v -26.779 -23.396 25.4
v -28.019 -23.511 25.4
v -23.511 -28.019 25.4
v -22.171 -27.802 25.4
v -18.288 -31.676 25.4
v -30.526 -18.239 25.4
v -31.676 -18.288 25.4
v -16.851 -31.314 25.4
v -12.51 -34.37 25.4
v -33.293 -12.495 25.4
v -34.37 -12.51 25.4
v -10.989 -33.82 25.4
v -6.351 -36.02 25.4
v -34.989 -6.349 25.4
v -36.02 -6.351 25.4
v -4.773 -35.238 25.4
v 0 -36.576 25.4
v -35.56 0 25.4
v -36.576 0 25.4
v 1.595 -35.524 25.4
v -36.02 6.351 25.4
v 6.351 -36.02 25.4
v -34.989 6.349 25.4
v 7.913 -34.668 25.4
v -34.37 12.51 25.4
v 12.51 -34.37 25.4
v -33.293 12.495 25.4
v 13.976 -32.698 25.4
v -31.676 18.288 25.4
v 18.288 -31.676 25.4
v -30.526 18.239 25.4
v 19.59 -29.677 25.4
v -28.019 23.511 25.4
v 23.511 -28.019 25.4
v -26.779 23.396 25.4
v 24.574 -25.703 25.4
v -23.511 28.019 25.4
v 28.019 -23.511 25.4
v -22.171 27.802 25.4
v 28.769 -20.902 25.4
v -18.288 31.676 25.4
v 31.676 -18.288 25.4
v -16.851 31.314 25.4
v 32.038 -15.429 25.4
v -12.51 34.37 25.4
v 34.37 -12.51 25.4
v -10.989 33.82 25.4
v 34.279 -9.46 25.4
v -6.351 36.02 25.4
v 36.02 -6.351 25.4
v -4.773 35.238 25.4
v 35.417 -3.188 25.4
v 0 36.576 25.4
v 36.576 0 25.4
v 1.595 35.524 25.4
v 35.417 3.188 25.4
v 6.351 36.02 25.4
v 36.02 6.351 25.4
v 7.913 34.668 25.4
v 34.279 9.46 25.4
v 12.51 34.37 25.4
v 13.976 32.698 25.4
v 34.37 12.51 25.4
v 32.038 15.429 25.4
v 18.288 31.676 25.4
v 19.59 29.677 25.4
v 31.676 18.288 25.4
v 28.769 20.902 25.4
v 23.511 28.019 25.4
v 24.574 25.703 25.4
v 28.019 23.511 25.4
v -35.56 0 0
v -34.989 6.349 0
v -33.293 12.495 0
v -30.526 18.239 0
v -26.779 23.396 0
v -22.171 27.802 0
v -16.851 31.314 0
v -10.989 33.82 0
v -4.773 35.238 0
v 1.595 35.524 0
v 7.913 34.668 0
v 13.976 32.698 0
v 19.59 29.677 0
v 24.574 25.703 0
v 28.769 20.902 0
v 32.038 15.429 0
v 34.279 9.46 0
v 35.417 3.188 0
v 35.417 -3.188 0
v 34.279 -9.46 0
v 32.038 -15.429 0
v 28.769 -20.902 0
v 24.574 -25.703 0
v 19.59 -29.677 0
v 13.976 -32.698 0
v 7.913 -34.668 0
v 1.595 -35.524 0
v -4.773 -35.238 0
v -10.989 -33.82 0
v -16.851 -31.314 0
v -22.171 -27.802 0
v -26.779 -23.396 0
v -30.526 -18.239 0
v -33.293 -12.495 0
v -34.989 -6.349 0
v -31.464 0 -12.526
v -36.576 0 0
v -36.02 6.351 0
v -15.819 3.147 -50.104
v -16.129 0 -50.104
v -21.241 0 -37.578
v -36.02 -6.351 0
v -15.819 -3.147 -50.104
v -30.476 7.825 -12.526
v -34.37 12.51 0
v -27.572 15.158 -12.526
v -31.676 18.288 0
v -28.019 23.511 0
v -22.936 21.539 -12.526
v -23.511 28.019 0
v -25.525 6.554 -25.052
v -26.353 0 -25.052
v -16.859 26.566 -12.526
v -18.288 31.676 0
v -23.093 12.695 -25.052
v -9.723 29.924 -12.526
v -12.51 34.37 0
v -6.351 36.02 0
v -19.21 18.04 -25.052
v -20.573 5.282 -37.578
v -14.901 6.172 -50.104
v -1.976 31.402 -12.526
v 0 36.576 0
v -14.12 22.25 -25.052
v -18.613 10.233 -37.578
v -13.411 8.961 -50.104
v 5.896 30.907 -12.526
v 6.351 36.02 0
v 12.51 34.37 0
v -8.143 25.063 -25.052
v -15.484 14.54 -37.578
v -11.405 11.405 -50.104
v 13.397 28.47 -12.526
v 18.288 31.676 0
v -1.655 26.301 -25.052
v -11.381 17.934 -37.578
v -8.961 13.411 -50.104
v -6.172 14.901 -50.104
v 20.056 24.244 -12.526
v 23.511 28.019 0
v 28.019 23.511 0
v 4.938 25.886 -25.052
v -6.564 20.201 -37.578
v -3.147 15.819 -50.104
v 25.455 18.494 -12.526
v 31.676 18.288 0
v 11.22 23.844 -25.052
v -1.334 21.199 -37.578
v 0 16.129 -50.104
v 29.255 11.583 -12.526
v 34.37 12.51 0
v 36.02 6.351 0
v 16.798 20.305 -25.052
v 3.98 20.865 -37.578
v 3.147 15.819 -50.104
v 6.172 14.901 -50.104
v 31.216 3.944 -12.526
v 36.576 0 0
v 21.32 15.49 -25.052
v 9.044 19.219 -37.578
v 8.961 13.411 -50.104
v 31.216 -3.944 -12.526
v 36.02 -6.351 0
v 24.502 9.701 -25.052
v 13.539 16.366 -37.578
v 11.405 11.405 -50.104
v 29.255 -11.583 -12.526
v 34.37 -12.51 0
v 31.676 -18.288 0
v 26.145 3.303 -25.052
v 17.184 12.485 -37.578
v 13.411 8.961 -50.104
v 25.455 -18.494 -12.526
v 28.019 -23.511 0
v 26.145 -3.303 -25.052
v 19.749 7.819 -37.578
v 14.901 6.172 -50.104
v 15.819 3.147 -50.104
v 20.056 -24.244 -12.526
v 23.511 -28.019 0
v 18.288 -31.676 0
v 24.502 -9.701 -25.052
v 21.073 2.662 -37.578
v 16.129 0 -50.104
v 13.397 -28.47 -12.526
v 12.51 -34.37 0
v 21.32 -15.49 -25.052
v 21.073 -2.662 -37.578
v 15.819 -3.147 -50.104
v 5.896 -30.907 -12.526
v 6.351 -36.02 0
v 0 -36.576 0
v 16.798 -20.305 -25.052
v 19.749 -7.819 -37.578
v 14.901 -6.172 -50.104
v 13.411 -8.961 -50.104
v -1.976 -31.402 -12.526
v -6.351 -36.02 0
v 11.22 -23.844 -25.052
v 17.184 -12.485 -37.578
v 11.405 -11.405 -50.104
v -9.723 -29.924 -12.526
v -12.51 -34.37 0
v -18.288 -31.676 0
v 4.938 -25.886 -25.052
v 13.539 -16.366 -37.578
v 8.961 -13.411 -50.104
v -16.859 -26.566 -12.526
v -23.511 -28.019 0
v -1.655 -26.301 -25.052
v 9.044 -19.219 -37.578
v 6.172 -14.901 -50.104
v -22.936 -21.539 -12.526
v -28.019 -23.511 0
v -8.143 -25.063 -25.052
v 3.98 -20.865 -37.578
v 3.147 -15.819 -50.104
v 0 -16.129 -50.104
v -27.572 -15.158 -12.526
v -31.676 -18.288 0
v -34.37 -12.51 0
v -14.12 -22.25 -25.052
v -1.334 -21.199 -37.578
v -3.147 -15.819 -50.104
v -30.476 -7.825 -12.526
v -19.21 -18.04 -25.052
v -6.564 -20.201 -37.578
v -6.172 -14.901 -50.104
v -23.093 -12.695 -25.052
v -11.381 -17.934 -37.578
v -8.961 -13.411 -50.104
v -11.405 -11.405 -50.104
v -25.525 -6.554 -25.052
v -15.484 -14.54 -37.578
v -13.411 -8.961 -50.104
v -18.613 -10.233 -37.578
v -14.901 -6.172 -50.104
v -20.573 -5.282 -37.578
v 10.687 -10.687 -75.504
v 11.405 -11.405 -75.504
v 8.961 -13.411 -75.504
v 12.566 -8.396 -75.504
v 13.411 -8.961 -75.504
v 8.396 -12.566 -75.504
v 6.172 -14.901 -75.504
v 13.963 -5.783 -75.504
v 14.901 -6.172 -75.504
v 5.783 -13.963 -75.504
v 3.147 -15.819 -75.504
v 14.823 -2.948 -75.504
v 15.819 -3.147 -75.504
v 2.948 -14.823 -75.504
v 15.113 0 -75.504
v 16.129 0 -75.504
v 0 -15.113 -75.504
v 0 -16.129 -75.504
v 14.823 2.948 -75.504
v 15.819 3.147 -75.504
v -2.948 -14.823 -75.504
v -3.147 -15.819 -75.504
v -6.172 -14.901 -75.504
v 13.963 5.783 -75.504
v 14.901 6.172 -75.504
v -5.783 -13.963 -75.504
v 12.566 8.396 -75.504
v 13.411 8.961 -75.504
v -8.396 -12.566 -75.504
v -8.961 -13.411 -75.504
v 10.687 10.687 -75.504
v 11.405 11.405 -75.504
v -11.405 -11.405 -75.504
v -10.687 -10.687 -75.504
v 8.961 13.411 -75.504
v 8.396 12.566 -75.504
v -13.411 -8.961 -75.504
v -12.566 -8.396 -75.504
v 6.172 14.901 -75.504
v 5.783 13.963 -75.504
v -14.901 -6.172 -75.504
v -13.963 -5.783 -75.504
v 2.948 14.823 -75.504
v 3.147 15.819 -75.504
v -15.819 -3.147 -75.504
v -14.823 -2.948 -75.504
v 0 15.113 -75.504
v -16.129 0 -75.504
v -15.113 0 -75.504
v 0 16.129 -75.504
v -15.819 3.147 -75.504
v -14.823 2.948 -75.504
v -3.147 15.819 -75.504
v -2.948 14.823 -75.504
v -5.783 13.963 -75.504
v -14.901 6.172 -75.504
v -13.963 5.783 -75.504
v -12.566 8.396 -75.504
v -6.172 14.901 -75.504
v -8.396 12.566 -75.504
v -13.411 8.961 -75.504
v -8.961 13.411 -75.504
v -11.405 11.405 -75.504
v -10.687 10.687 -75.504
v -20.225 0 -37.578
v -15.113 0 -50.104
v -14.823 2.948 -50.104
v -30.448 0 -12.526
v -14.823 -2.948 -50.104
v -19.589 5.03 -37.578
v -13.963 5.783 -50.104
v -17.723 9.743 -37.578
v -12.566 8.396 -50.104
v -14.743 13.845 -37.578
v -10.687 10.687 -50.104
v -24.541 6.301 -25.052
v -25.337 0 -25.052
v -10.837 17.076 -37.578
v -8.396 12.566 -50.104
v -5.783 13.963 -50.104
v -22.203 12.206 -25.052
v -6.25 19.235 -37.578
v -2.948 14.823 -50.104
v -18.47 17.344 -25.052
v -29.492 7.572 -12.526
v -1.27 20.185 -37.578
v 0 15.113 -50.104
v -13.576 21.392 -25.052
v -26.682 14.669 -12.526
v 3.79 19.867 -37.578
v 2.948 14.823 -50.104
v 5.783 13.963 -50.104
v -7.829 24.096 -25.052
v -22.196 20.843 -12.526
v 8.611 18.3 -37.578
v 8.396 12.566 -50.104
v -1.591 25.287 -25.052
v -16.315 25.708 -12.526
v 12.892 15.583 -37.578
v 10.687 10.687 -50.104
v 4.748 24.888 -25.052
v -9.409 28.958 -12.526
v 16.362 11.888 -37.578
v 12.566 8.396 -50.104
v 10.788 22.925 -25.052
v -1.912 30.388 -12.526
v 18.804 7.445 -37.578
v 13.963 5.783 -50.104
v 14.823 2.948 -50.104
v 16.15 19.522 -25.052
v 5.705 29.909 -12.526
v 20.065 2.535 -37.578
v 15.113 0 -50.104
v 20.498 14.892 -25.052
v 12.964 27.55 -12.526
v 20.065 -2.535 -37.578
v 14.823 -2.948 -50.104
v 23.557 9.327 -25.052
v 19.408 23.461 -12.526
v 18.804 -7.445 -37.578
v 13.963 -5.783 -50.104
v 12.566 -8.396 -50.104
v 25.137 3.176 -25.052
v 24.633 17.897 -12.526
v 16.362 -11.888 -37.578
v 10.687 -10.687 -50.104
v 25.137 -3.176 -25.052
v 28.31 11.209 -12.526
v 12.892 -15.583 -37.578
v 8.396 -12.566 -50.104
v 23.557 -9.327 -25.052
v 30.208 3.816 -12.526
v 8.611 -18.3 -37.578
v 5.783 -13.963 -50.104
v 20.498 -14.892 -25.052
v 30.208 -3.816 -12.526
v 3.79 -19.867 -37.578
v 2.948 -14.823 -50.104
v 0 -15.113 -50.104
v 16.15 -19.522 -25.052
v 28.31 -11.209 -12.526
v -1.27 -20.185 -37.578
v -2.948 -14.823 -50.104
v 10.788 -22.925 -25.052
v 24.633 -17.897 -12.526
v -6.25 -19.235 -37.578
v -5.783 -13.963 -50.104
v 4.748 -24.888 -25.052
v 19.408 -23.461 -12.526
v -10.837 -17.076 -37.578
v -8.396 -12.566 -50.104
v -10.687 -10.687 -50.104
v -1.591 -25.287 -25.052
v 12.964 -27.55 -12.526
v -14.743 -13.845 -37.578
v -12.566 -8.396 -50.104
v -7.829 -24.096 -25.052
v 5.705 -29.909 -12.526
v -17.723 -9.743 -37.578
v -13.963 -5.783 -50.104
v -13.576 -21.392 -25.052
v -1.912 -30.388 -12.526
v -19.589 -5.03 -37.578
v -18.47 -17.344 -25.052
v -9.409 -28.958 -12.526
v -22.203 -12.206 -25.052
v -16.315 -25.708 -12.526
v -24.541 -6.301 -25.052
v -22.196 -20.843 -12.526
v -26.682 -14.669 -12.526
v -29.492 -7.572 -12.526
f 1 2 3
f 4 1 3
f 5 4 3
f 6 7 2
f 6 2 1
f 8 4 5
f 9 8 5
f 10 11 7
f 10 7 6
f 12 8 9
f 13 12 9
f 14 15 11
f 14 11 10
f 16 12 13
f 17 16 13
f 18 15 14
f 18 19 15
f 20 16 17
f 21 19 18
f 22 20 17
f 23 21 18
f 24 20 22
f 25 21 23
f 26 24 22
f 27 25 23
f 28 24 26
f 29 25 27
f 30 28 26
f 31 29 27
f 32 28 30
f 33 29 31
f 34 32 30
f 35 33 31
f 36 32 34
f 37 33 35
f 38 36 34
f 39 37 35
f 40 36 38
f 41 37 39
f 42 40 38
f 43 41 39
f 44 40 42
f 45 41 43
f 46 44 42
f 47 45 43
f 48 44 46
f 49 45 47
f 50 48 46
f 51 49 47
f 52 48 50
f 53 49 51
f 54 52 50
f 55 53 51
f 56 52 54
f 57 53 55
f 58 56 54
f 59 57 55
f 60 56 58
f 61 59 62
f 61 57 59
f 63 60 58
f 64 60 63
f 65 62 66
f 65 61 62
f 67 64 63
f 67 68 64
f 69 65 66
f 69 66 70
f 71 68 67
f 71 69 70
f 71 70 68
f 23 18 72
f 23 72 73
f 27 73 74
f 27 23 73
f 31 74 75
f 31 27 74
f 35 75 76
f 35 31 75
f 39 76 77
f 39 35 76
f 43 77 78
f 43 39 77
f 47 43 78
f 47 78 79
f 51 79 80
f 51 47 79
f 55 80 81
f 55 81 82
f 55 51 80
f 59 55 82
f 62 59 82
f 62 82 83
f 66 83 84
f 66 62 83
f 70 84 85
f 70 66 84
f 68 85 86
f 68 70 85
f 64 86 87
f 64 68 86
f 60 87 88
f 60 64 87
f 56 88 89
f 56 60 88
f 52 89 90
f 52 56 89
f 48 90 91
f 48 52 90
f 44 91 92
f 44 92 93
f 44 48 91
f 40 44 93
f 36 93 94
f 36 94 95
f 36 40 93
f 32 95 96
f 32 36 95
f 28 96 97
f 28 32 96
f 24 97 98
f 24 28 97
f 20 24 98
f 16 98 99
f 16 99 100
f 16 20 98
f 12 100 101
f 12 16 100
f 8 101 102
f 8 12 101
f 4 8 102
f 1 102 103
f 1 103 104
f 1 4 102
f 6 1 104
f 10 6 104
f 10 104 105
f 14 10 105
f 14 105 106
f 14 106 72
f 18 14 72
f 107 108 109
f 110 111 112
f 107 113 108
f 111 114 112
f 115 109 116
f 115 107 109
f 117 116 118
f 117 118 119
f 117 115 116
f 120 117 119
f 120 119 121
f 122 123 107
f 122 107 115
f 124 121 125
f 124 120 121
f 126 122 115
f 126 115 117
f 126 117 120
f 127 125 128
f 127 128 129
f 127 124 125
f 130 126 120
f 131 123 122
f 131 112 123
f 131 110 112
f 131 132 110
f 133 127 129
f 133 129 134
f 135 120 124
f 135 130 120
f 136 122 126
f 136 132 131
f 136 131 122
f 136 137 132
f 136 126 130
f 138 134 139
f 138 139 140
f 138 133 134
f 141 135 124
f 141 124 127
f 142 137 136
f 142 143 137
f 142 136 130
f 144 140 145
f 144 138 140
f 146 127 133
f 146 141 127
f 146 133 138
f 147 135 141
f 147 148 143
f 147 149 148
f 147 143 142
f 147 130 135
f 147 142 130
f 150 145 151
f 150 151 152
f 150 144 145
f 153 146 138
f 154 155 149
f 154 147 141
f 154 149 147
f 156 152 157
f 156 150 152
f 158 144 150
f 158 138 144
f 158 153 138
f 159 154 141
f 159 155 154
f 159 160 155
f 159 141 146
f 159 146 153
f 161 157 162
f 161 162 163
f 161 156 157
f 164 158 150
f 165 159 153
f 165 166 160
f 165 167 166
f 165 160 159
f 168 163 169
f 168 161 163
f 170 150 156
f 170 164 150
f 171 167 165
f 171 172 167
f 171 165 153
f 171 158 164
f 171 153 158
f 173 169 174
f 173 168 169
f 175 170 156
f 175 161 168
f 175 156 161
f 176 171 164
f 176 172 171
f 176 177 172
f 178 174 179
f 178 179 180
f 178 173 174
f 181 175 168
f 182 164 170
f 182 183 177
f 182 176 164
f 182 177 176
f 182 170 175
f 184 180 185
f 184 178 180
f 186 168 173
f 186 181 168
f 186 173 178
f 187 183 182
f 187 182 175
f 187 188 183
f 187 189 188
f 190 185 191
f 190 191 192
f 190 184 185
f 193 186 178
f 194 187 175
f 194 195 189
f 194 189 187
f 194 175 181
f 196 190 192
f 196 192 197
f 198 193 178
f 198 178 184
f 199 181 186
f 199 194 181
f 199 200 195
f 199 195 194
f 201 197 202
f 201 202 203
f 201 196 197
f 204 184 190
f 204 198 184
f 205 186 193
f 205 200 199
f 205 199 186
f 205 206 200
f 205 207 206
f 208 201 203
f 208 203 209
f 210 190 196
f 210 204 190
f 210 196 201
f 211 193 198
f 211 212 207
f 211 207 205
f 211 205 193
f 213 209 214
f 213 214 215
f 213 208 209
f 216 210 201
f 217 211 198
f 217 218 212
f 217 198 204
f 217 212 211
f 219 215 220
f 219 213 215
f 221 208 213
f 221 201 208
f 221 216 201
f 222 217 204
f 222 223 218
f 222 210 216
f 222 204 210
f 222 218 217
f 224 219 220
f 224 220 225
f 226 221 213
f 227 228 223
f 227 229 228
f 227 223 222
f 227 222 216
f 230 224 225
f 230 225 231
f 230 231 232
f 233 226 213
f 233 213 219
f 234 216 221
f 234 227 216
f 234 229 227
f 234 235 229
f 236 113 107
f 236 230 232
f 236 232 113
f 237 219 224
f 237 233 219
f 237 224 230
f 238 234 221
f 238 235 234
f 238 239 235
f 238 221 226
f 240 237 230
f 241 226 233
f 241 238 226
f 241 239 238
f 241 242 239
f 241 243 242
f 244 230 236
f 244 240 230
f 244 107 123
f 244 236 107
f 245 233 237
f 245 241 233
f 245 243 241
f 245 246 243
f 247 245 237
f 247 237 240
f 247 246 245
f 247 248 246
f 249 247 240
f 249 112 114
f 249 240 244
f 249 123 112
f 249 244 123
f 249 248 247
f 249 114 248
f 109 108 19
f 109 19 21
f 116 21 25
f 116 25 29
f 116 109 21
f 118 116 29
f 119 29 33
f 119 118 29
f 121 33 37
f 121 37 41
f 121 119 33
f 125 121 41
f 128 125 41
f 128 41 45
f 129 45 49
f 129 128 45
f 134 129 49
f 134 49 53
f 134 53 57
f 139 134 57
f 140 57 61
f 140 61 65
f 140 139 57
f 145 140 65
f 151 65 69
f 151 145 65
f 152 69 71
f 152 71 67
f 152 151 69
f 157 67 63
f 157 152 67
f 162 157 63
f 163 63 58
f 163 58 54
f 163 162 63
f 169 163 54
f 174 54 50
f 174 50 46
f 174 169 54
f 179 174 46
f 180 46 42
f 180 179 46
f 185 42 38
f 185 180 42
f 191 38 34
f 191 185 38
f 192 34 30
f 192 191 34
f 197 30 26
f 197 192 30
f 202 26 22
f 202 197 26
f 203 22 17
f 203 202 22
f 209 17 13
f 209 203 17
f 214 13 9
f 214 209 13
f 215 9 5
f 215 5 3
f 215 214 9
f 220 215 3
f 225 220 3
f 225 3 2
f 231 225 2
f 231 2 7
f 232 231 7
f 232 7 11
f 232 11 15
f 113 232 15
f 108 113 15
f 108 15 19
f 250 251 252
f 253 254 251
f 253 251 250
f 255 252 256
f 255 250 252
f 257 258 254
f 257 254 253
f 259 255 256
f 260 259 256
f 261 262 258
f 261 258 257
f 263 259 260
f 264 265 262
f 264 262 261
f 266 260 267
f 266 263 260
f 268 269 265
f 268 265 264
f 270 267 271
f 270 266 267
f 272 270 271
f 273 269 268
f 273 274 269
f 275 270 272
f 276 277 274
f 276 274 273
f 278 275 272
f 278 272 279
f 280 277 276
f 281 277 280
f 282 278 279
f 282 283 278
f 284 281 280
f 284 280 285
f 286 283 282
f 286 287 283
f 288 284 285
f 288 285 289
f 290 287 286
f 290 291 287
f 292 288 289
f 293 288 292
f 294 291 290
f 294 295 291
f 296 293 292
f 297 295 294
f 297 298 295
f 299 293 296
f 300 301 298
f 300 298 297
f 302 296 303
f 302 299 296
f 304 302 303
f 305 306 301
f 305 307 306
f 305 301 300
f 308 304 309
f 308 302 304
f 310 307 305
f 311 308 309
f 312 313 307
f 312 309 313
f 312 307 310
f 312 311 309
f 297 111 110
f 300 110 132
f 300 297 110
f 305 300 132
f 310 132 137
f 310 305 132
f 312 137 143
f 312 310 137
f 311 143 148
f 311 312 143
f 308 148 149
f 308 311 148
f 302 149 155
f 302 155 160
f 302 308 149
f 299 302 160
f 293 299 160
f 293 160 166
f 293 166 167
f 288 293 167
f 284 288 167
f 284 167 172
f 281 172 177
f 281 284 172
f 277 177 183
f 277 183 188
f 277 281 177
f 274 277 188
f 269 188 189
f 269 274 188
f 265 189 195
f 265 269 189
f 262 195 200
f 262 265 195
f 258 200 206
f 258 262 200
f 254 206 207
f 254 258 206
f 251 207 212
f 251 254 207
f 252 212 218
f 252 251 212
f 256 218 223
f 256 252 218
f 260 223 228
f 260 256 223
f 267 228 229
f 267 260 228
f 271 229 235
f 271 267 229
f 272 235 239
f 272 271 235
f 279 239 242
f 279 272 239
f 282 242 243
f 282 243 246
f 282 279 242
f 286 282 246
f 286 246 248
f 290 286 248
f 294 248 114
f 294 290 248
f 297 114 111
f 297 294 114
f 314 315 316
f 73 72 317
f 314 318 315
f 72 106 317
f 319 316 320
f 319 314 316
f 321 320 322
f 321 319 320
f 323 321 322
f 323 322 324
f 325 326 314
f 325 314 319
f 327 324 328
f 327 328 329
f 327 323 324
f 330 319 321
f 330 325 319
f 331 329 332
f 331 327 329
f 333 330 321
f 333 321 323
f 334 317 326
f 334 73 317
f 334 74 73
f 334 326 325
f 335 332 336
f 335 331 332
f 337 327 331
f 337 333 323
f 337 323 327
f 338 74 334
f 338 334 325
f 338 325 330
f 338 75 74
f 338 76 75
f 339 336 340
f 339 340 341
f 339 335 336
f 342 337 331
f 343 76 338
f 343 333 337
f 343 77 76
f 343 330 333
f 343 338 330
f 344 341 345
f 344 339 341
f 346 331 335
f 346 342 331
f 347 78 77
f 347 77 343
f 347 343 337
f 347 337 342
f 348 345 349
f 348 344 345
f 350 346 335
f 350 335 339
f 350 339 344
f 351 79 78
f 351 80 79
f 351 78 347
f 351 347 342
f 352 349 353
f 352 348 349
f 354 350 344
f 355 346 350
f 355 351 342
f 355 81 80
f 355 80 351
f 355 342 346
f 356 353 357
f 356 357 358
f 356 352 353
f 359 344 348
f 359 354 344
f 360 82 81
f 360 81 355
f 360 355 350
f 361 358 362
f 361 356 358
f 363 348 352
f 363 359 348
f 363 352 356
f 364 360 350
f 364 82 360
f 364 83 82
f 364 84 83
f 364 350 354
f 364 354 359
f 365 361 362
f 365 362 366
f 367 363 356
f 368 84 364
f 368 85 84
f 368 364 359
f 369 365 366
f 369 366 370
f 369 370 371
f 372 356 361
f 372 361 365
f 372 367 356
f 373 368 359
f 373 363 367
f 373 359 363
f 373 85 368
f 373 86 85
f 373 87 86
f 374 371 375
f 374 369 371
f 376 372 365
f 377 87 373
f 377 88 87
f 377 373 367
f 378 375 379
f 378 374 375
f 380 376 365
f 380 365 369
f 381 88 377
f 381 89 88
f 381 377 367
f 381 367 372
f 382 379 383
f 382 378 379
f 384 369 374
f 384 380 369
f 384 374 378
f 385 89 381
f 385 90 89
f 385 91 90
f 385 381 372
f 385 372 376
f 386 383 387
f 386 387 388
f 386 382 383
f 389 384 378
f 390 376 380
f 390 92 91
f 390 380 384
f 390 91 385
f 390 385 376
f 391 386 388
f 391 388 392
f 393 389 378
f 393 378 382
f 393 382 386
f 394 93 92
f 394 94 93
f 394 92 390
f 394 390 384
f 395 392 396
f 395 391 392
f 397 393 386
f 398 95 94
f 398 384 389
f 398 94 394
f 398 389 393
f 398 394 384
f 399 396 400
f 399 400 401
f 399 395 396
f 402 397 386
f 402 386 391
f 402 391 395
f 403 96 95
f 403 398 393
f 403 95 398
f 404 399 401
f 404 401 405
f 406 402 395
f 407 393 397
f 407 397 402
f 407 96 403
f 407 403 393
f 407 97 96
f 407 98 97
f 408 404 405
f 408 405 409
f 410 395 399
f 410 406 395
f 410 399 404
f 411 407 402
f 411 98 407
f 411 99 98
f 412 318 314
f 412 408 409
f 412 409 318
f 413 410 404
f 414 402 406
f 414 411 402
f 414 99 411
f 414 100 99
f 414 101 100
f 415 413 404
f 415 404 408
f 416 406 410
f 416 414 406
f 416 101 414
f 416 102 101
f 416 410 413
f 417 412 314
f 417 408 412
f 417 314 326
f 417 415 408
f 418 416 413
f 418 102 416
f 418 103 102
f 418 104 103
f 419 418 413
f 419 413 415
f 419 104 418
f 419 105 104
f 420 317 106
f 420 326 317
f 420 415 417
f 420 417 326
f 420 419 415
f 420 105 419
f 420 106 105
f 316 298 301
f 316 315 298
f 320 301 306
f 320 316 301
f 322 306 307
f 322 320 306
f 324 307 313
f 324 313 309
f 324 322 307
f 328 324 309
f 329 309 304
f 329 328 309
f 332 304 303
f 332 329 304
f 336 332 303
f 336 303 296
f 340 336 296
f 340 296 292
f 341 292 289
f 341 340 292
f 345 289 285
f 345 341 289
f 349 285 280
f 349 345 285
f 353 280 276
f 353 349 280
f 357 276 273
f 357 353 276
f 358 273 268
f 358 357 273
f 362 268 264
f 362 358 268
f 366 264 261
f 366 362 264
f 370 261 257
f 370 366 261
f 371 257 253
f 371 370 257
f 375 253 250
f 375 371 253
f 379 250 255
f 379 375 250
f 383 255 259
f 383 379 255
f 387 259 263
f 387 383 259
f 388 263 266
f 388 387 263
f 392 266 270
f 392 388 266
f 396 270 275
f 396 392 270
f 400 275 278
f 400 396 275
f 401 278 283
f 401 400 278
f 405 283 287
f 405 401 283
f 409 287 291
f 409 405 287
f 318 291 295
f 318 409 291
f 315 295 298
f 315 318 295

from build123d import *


# Not quite as in the source:
# - ends of sketch curves that miss each other by under 0.0002 mm in the source are joined


with BuildPart() as f1:
    # F0 (on Front) → F1 (revolve)
    with BuildSketch(Plane.XZ):
        Polygon((-15.113, -75.5039413649), (-15.113, -50.1039413649), (-16.1289999974, -50.1038177847), (-16.1289999982, -75.5039413649), align=None)
        Polygon((-15.1129998177, -50.1039412905), (-35.5600012367, -0.0001234082), (-36.5760016743, 7.015e-07), (-16.1290002526, -50.1038178889), align=None)
        Polygon((-36.5760016743, 7.015e-07), (-35.5600012367, -0.0001228868), (-35.56, 25.3998765918), (-36.5759999982, 25.3998765918), align=None)
    revolve(axis=Axis((0, 0, -37.7519706824), (0, 0, -1)))


solid = f1.part
